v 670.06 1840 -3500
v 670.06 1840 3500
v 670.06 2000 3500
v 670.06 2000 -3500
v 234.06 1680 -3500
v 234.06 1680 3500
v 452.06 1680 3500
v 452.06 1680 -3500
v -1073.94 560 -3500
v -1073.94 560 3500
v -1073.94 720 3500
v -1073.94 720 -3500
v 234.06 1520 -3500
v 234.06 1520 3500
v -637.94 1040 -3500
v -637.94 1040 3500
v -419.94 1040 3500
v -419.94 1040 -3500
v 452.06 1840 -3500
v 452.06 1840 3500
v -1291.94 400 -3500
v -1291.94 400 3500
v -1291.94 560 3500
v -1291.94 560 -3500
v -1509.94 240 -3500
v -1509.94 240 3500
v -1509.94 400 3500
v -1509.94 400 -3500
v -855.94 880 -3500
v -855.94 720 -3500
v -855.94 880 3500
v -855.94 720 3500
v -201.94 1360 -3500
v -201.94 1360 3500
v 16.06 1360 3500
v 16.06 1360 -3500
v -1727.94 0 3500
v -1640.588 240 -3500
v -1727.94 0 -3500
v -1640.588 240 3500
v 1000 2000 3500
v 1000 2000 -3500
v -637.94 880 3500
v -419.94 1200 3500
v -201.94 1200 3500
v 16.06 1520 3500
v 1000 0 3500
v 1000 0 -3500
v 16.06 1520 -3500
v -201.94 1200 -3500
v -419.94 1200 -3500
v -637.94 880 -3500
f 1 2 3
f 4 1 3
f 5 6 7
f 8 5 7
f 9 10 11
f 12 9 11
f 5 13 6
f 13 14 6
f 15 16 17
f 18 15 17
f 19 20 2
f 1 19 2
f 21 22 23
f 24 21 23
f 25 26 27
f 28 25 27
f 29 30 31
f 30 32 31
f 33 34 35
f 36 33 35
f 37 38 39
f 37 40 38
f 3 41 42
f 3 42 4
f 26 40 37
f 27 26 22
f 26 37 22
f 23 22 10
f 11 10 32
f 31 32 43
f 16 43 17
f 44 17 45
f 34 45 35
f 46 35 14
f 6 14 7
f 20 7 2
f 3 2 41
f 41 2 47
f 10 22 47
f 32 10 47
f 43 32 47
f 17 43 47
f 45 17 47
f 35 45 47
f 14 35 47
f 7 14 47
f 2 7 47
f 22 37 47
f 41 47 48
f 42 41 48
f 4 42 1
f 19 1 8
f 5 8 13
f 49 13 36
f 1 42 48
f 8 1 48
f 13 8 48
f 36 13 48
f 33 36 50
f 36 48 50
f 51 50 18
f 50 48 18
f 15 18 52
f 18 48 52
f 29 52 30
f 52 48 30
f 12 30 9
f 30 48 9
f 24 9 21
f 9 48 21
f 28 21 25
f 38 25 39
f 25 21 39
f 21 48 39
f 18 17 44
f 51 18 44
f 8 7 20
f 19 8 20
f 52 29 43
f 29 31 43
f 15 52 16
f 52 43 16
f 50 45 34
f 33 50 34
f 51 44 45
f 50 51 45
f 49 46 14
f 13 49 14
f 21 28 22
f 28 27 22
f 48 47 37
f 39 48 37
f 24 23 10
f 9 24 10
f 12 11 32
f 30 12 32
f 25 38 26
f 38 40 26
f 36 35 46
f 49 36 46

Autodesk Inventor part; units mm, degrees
ref_plane "YZ Plane" through (0, 0, 0) normal (1, 0, 0) x (0, 1, 0)
ref_plane "XZ Plane" through (0, 0, 0) normal (0, 1, 0) x (-1, 0, 0)
ref_plane "XY Plane" through (0, 0, 0) normal (0, 0, 1) x (1, 0, 0)
sketch "Sketch1" plane through (0, 0, 0) normal (0, 1, 0) x (-1, 0, 0)
  line L0 (1000, 3500) -> (-1000, 3500)
  line L1 (-1000, 3500) -> (-1000, -3500)
  line L2 (-1000, -3500) -> (1000, -3500)
  line L3 (1000, -3500) -> (1000, 3500)
  line L4 (1000, 3500) -> (-1000, -3500) construction
  line L5 (-1000, 3500) -> (1000, -3500) construction
  point P0 (0, 0)
  dimension "d0" = 2000
  dimension "d1" = 7000
extrude "Extrusion1" add sketch "Sketch1" along normal blind 2000
sketch "Sketch2" plane through (-1000, 0, 3500) normal (0, 0, 1) x (1, 0, 0)
  line L0 (2000, 2000) -> (0, 2000) projected
  line L1 (0, 2000) -> (0, 0)
  line L2 (0, 0) -> (-727.9405, 0)
  line L3 (2000, 0) -> (0, 0) projected
  line L4 (0, 2000) -> (-727.9405, 0)
  line L5 (0, 2000) -> (2128.3555, 2000) construction
  point P0 (1000, 0)
  dimension "d4" = 110
extrude "Extrusion2" add sketch "Sketch2" against normal blind 7000
sketch "Sketch3" plane through (1000, 0, 3500) normal (0, 0, 1) x (1, 0, 0)
  line L0 (0, 0) -> (0, 2000) projected
  line L1 (0, 0) -> (0, 160)
  line L2 (0, 160) -> (0, 320)
  line L3 (0, 320) -> (0, 480)
  line L4 (0, 480) -> (0, 640)
  line L5 (0, 640) -> (0, 800)
  line L6 (0, 800) -> (0, 960)
  line L7 (0, 960) -> (0, 1120)
  line L8 (0, 1120) -> (0, 1280)
  line L9 (0, 1280) -> (0, 1440)
  line L10 (0, 1440) -> (0, 1600)
  line L11 (0, 1600) -> (0, 1760)
  line L12 (0, 1760) -> (0, 1920)
  line L13 (0, 1920) -> (0, 2000.3283)
  line L14 (0, 0) -> (-2727.9405, 0) projected
  line L15 (-2727.9405, 0) -> (-2509.9405, 0)
  line L16 (-2509.9405, 0) -> (-2291.9405, 0)
  line L17 (-2291.9405, 0) -> (-2073.9405, 0)
  line L18 (-2073.9405, 0) -> (-1855.9405, 0)
  line L19 (-1855.9405, 0) -> (-1637.9405, 0)
  line L20 (-1637.9405, 0) -> (-1419.9405, 0)
  line L21 (-1419.9405, 0) -> (-1201.9405, 0)
  line L22 (-1201.9405, 0) -> (-983.9405, 0)
  line L23 (-983.9405, 0) -> (-765.9405, 0)
  line L24 (-765.9405, 0) -> (-547.9405, 0)
  line L25 (-547.9405, 0) -> (-329.9405, 0)
  line L26 (-329.9405, 0) -> (-111.9405, 0)
  line L27 (-111.9405, 0) -> (0, 0)
  line L28 (-2727.9405, 0) -> (-2640.5876, 240)
  line L29 (-2727.9405, 0) -> (-2000, 2000) projected
  line L30 (-2640.5876, 240) -> (-2509.9405, 240)
  line L31 (-2509.9405, 240) -> (-2509.9405, 400)
  line L32 (-2509.9405, 400) -> (-2291.9405, 400)
  line L33 (-2291.9405, 400) -> (-2291.9405, 560)
  line L34 (-2291.9405, 560) -> (-2073.9405, 560)
  line L35 (-2073.9405, 560) -> (-2073.9405, 720)
  line L36 (-2073.9405, 720) -> (-1855.9405, 720)
  line L37 (-1855.9405, 720) -> (-1855.9405, 880)
  line L38 (-1855.9405, 880) -> (-1637.9405, 880)
  line L39 (-1637.9405, 880) -> (-1637.9405, 1040)
  line L40 (-1637.9405, 1040) -> (-1419.9405, 1040)
  line L41 (-1419.9405, 1040) -> (-1419.9405, 1200)
  line L42 (-1419.9405, 1200) -> (-1201.9405, 1200)
  line L43 (-1201.9405, 1200) -> (-1201.9405, 1360)
  line L44 (-1201.9405, 1360) -> (-983.9405, 1360)
  line L45 (-983.9405, 1360) -> (-983.9405, 1520)
  line L46 (-983.9405, 1520) -> (-765.9405, 1520)
  line L47 (-765.9405, 1520) -> (-765.9405, 1680)
  line L48 (-765.9405, 1680) -> (-547.9405, 1680)
  line L49 (-547.9405, 1680) -> (-547.9405, 1840)
  line L50 (-547.9405, 1840) -> (-329.9405, 1840)
  line L51 (-329.9405, 1840) -> (-329.9405, 2000)
  line L52 (-329.9405, 2000) -> (-2000, 2000)
  line L53 (-2000, 2000) -> (-2640.5876, 240)
  point P0 (-1000, 0)
  dimension "d7" = 160
  dimension "d8" = 160
  dimension "d9" = 160
  dimension "d10" = 160
  dimension "d11" = 160
  dimension "d12" = 160
  dimension "d13" = 160
  dimension "d14" = 160
  dimension "d15" = 160
  dimension "d16" = 160
  dimension "d17" = 160
  dimension "d18" = 160
  dimension "d19" = 218
  dimension "d20" = 218
  dimension "d21" = 218
  dimension "d22" = 218
  dimension "d23" = 218
  dimension "d24" = 218
  dimension "d25" = 218
  dimension "d26" = 218
  dimension "d27" = 218
  dimension "d28" = 218
  dimension "d29" = 218
  dimension "d30" = 218
extrude "Extrusion3" cut sketch "Sketch3" against normal through all
properties part number "front_stair"
